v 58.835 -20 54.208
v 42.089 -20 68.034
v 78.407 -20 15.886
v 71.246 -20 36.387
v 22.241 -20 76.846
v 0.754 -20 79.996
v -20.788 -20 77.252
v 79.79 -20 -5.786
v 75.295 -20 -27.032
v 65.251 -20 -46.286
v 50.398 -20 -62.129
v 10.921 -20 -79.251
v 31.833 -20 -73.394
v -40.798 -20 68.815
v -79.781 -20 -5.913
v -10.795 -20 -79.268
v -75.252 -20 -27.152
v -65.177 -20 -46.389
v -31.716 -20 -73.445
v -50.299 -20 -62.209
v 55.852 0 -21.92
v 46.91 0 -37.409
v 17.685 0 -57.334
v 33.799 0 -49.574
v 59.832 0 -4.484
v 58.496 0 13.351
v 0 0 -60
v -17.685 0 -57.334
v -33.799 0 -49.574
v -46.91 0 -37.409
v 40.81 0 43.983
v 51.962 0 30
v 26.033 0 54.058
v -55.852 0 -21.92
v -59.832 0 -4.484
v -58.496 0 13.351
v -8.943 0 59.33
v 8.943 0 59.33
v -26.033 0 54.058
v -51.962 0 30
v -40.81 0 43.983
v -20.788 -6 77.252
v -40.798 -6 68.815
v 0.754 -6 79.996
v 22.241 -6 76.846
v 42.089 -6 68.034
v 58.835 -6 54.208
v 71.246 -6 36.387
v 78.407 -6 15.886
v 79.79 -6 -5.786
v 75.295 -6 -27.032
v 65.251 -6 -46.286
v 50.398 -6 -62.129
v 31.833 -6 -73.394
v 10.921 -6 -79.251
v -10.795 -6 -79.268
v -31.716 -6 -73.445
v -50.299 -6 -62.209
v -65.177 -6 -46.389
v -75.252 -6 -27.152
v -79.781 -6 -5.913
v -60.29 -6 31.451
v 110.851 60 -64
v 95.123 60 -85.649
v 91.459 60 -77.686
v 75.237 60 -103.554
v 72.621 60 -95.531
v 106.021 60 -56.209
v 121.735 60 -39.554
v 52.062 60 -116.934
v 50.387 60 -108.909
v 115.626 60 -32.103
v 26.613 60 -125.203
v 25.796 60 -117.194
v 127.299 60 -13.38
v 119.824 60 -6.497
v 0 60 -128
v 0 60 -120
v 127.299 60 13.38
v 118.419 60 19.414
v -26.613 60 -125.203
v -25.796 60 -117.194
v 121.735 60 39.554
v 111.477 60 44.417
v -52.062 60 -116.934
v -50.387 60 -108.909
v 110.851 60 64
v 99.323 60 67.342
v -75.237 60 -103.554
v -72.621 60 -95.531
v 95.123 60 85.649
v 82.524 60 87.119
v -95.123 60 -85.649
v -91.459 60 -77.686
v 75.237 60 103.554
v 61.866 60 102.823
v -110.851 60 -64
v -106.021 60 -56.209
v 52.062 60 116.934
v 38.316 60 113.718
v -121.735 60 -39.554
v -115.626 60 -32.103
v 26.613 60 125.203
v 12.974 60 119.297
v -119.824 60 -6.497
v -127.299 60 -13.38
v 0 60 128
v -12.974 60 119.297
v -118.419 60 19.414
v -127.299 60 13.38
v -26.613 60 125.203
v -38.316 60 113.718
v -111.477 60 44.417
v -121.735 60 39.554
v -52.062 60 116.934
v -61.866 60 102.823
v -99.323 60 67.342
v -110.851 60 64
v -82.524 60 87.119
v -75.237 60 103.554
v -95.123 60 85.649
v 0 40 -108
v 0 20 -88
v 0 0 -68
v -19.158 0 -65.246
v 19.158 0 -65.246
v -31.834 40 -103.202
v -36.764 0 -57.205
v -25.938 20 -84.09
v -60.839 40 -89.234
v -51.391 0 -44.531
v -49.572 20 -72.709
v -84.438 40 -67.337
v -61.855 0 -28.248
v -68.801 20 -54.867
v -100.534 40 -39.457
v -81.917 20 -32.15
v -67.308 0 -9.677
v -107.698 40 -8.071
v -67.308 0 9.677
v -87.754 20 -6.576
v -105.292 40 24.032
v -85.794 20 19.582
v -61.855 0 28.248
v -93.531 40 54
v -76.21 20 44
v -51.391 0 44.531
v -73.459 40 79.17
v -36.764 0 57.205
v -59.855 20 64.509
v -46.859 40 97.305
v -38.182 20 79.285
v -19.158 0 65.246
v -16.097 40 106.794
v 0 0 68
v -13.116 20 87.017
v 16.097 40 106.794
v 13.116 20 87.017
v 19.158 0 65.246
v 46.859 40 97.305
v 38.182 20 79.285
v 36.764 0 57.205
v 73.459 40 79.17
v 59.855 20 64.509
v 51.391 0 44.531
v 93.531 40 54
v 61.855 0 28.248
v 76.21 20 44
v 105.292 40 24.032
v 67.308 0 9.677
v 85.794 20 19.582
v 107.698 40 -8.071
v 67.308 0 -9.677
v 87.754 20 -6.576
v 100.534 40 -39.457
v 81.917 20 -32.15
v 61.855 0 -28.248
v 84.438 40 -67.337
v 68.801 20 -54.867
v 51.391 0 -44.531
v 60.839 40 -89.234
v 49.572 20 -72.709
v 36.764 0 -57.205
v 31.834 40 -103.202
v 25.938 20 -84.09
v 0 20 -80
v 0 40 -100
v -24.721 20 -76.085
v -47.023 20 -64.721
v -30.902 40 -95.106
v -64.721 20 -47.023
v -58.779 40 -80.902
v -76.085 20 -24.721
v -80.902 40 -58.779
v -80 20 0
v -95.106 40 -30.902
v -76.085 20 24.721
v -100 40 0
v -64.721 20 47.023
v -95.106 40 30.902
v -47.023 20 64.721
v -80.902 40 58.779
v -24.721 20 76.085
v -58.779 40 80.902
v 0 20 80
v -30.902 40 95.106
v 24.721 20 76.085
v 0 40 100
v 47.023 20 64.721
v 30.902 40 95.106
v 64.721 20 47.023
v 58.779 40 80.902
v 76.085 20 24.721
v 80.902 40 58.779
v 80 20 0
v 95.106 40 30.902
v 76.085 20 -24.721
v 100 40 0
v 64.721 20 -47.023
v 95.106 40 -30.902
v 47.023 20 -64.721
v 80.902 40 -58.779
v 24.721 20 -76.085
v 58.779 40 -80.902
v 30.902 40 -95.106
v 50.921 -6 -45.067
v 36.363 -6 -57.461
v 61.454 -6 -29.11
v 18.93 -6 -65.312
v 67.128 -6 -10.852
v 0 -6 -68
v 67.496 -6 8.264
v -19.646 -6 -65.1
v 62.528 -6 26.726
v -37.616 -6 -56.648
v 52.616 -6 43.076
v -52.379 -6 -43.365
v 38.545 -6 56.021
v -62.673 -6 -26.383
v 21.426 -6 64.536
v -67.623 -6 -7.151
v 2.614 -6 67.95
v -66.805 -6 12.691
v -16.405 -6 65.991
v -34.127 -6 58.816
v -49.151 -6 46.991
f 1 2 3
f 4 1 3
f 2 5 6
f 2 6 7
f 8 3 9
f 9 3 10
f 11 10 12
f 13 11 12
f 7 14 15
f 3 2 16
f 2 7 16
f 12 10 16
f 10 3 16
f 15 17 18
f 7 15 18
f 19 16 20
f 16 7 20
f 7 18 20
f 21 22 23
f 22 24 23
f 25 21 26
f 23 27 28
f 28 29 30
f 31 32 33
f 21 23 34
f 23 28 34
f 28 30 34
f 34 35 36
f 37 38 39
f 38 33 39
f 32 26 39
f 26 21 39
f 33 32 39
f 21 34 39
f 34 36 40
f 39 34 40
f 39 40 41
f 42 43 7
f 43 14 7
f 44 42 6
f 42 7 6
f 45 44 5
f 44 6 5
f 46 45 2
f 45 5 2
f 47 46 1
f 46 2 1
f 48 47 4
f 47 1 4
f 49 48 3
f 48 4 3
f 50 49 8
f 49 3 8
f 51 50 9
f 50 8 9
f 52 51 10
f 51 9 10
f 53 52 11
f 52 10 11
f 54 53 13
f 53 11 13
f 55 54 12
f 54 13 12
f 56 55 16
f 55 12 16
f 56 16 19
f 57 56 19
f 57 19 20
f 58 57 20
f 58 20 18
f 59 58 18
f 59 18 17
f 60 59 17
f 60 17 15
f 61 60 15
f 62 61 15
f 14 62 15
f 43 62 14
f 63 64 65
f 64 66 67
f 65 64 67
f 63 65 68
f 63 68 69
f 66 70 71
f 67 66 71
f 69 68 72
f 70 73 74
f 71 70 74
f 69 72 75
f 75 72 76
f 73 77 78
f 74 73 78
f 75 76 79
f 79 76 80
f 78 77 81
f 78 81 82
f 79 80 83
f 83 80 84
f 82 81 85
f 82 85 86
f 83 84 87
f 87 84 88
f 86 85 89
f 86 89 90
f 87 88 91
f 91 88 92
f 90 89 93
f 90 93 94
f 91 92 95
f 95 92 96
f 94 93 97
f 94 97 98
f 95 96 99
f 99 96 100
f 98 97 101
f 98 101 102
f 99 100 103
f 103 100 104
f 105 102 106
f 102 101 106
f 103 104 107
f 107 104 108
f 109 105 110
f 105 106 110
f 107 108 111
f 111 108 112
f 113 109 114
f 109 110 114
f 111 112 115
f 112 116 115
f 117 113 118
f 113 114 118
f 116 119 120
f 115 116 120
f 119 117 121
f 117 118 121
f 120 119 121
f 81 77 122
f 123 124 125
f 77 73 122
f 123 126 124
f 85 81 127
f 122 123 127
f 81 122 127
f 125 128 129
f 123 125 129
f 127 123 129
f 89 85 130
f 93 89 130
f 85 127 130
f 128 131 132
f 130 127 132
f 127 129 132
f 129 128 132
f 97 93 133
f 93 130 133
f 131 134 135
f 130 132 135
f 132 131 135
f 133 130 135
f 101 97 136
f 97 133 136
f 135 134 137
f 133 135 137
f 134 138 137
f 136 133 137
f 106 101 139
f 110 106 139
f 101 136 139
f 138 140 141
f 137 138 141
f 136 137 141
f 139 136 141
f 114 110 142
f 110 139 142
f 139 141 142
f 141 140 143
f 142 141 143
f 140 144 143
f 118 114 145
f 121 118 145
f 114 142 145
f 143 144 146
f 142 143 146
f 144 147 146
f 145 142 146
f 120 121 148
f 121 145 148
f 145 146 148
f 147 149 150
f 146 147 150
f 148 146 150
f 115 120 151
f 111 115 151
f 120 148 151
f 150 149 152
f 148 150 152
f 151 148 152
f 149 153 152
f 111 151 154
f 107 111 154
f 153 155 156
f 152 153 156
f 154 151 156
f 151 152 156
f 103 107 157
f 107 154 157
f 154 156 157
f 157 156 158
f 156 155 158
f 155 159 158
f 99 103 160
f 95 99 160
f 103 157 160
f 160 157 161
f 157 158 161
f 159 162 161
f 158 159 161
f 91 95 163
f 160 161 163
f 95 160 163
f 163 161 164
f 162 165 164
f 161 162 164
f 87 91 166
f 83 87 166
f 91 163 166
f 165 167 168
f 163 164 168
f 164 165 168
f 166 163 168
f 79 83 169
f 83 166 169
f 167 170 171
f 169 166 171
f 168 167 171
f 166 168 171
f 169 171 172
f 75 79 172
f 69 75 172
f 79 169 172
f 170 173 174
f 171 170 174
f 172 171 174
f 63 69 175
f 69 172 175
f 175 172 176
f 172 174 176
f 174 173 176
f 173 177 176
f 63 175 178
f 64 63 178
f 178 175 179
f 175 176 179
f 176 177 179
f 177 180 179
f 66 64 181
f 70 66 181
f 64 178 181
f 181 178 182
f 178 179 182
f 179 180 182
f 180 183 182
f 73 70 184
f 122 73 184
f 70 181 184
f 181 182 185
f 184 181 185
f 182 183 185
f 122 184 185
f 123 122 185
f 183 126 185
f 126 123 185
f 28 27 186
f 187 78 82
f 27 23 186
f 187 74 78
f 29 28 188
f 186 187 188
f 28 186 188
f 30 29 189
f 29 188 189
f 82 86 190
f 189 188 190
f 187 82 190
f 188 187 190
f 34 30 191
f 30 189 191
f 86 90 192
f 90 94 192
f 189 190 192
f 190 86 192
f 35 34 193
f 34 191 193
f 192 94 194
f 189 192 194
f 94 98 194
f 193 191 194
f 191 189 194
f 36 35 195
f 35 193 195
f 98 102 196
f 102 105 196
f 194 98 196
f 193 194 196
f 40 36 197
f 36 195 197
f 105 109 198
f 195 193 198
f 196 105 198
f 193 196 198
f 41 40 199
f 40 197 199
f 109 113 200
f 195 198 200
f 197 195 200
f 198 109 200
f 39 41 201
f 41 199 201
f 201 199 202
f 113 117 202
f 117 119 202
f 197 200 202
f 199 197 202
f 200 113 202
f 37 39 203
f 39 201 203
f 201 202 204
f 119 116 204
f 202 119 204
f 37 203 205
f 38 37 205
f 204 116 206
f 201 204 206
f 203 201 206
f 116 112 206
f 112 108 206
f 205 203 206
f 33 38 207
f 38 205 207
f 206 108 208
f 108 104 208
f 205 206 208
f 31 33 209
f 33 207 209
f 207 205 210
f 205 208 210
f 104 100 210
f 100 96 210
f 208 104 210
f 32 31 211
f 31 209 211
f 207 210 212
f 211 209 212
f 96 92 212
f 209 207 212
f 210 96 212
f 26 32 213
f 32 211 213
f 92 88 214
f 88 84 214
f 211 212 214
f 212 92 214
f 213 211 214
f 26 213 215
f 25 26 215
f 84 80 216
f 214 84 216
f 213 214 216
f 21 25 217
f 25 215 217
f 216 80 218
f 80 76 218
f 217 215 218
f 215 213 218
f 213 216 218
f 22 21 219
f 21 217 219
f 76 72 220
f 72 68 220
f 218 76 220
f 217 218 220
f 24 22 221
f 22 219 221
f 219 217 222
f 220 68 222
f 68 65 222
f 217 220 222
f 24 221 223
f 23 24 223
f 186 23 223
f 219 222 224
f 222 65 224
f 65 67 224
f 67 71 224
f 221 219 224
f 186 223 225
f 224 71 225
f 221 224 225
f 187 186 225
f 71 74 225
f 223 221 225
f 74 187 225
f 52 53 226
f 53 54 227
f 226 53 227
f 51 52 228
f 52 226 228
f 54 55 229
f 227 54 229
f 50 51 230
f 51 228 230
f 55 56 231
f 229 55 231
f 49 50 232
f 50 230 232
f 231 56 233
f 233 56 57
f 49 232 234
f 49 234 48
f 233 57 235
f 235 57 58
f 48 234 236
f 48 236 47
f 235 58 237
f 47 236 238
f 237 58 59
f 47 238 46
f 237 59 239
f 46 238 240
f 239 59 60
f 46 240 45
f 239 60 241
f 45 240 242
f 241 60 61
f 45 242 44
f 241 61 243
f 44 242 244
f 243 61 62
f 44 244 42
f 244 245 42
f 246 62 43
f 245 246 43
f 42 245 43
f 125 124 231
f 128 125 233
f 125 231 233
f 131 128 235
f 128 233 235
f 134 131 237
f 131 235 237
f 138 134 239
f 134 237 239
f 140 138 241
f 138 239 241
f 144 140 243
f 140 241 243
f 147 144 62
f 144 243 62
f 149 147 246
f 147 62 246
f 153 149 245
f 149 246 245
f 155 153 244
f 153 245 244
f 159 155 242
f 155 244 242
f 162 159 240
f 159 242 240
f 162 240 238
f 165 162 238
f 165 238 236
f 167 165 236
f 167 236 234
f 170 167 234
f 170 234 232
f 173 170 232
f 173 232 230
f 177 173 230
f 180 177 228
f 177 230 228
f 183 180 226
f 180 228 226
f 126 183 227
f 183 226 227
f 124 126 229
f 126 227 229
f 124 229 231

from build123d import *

# Parameters (mm, degrees)
ENL_V_MAT_EXTRU_1_DEPTH = 15


with BuildPart() as part:
    # Esquisse1 → Révolution1 (revolve)
    with BuildSketch(Plane.XY, mode=Mode.PRIVATE) as r_volution1_sk:
        Polygon((0, 0), (-60, 0), (-120, 60), (-128, 60), (-68, 0), (-68, -6), (-80, -6), (-80, -20), (0, -20), align=None)
    revolve(r_volution1_sk.sketch.rotate(Axis((0, -20, 0), (0, 1, 0)), 270), axis=Axis((0, -20, 0), (0, 1, 0)))  # turned: the seam where the file's is

    # Esquisse8 → Enlèv. mat.-Extru.1 (cut, through all)
    with BuildSketch(Plane(origin=(0, -6, 0), x_dir=(1, 0, 0), z_dir=(0, 1, 0))):
        Polygon((-79.781170075, 5.913112665), (-40.797993833, -68.815141497), (-98.313445601, -98.818987004), (-137.296621843, -24.090732842), align=None)
    extrude(amount=-ENL_V_MAT_EXTRU_1_DEPTH, mode=Mode.SUBTRACT)


solid = part.part
